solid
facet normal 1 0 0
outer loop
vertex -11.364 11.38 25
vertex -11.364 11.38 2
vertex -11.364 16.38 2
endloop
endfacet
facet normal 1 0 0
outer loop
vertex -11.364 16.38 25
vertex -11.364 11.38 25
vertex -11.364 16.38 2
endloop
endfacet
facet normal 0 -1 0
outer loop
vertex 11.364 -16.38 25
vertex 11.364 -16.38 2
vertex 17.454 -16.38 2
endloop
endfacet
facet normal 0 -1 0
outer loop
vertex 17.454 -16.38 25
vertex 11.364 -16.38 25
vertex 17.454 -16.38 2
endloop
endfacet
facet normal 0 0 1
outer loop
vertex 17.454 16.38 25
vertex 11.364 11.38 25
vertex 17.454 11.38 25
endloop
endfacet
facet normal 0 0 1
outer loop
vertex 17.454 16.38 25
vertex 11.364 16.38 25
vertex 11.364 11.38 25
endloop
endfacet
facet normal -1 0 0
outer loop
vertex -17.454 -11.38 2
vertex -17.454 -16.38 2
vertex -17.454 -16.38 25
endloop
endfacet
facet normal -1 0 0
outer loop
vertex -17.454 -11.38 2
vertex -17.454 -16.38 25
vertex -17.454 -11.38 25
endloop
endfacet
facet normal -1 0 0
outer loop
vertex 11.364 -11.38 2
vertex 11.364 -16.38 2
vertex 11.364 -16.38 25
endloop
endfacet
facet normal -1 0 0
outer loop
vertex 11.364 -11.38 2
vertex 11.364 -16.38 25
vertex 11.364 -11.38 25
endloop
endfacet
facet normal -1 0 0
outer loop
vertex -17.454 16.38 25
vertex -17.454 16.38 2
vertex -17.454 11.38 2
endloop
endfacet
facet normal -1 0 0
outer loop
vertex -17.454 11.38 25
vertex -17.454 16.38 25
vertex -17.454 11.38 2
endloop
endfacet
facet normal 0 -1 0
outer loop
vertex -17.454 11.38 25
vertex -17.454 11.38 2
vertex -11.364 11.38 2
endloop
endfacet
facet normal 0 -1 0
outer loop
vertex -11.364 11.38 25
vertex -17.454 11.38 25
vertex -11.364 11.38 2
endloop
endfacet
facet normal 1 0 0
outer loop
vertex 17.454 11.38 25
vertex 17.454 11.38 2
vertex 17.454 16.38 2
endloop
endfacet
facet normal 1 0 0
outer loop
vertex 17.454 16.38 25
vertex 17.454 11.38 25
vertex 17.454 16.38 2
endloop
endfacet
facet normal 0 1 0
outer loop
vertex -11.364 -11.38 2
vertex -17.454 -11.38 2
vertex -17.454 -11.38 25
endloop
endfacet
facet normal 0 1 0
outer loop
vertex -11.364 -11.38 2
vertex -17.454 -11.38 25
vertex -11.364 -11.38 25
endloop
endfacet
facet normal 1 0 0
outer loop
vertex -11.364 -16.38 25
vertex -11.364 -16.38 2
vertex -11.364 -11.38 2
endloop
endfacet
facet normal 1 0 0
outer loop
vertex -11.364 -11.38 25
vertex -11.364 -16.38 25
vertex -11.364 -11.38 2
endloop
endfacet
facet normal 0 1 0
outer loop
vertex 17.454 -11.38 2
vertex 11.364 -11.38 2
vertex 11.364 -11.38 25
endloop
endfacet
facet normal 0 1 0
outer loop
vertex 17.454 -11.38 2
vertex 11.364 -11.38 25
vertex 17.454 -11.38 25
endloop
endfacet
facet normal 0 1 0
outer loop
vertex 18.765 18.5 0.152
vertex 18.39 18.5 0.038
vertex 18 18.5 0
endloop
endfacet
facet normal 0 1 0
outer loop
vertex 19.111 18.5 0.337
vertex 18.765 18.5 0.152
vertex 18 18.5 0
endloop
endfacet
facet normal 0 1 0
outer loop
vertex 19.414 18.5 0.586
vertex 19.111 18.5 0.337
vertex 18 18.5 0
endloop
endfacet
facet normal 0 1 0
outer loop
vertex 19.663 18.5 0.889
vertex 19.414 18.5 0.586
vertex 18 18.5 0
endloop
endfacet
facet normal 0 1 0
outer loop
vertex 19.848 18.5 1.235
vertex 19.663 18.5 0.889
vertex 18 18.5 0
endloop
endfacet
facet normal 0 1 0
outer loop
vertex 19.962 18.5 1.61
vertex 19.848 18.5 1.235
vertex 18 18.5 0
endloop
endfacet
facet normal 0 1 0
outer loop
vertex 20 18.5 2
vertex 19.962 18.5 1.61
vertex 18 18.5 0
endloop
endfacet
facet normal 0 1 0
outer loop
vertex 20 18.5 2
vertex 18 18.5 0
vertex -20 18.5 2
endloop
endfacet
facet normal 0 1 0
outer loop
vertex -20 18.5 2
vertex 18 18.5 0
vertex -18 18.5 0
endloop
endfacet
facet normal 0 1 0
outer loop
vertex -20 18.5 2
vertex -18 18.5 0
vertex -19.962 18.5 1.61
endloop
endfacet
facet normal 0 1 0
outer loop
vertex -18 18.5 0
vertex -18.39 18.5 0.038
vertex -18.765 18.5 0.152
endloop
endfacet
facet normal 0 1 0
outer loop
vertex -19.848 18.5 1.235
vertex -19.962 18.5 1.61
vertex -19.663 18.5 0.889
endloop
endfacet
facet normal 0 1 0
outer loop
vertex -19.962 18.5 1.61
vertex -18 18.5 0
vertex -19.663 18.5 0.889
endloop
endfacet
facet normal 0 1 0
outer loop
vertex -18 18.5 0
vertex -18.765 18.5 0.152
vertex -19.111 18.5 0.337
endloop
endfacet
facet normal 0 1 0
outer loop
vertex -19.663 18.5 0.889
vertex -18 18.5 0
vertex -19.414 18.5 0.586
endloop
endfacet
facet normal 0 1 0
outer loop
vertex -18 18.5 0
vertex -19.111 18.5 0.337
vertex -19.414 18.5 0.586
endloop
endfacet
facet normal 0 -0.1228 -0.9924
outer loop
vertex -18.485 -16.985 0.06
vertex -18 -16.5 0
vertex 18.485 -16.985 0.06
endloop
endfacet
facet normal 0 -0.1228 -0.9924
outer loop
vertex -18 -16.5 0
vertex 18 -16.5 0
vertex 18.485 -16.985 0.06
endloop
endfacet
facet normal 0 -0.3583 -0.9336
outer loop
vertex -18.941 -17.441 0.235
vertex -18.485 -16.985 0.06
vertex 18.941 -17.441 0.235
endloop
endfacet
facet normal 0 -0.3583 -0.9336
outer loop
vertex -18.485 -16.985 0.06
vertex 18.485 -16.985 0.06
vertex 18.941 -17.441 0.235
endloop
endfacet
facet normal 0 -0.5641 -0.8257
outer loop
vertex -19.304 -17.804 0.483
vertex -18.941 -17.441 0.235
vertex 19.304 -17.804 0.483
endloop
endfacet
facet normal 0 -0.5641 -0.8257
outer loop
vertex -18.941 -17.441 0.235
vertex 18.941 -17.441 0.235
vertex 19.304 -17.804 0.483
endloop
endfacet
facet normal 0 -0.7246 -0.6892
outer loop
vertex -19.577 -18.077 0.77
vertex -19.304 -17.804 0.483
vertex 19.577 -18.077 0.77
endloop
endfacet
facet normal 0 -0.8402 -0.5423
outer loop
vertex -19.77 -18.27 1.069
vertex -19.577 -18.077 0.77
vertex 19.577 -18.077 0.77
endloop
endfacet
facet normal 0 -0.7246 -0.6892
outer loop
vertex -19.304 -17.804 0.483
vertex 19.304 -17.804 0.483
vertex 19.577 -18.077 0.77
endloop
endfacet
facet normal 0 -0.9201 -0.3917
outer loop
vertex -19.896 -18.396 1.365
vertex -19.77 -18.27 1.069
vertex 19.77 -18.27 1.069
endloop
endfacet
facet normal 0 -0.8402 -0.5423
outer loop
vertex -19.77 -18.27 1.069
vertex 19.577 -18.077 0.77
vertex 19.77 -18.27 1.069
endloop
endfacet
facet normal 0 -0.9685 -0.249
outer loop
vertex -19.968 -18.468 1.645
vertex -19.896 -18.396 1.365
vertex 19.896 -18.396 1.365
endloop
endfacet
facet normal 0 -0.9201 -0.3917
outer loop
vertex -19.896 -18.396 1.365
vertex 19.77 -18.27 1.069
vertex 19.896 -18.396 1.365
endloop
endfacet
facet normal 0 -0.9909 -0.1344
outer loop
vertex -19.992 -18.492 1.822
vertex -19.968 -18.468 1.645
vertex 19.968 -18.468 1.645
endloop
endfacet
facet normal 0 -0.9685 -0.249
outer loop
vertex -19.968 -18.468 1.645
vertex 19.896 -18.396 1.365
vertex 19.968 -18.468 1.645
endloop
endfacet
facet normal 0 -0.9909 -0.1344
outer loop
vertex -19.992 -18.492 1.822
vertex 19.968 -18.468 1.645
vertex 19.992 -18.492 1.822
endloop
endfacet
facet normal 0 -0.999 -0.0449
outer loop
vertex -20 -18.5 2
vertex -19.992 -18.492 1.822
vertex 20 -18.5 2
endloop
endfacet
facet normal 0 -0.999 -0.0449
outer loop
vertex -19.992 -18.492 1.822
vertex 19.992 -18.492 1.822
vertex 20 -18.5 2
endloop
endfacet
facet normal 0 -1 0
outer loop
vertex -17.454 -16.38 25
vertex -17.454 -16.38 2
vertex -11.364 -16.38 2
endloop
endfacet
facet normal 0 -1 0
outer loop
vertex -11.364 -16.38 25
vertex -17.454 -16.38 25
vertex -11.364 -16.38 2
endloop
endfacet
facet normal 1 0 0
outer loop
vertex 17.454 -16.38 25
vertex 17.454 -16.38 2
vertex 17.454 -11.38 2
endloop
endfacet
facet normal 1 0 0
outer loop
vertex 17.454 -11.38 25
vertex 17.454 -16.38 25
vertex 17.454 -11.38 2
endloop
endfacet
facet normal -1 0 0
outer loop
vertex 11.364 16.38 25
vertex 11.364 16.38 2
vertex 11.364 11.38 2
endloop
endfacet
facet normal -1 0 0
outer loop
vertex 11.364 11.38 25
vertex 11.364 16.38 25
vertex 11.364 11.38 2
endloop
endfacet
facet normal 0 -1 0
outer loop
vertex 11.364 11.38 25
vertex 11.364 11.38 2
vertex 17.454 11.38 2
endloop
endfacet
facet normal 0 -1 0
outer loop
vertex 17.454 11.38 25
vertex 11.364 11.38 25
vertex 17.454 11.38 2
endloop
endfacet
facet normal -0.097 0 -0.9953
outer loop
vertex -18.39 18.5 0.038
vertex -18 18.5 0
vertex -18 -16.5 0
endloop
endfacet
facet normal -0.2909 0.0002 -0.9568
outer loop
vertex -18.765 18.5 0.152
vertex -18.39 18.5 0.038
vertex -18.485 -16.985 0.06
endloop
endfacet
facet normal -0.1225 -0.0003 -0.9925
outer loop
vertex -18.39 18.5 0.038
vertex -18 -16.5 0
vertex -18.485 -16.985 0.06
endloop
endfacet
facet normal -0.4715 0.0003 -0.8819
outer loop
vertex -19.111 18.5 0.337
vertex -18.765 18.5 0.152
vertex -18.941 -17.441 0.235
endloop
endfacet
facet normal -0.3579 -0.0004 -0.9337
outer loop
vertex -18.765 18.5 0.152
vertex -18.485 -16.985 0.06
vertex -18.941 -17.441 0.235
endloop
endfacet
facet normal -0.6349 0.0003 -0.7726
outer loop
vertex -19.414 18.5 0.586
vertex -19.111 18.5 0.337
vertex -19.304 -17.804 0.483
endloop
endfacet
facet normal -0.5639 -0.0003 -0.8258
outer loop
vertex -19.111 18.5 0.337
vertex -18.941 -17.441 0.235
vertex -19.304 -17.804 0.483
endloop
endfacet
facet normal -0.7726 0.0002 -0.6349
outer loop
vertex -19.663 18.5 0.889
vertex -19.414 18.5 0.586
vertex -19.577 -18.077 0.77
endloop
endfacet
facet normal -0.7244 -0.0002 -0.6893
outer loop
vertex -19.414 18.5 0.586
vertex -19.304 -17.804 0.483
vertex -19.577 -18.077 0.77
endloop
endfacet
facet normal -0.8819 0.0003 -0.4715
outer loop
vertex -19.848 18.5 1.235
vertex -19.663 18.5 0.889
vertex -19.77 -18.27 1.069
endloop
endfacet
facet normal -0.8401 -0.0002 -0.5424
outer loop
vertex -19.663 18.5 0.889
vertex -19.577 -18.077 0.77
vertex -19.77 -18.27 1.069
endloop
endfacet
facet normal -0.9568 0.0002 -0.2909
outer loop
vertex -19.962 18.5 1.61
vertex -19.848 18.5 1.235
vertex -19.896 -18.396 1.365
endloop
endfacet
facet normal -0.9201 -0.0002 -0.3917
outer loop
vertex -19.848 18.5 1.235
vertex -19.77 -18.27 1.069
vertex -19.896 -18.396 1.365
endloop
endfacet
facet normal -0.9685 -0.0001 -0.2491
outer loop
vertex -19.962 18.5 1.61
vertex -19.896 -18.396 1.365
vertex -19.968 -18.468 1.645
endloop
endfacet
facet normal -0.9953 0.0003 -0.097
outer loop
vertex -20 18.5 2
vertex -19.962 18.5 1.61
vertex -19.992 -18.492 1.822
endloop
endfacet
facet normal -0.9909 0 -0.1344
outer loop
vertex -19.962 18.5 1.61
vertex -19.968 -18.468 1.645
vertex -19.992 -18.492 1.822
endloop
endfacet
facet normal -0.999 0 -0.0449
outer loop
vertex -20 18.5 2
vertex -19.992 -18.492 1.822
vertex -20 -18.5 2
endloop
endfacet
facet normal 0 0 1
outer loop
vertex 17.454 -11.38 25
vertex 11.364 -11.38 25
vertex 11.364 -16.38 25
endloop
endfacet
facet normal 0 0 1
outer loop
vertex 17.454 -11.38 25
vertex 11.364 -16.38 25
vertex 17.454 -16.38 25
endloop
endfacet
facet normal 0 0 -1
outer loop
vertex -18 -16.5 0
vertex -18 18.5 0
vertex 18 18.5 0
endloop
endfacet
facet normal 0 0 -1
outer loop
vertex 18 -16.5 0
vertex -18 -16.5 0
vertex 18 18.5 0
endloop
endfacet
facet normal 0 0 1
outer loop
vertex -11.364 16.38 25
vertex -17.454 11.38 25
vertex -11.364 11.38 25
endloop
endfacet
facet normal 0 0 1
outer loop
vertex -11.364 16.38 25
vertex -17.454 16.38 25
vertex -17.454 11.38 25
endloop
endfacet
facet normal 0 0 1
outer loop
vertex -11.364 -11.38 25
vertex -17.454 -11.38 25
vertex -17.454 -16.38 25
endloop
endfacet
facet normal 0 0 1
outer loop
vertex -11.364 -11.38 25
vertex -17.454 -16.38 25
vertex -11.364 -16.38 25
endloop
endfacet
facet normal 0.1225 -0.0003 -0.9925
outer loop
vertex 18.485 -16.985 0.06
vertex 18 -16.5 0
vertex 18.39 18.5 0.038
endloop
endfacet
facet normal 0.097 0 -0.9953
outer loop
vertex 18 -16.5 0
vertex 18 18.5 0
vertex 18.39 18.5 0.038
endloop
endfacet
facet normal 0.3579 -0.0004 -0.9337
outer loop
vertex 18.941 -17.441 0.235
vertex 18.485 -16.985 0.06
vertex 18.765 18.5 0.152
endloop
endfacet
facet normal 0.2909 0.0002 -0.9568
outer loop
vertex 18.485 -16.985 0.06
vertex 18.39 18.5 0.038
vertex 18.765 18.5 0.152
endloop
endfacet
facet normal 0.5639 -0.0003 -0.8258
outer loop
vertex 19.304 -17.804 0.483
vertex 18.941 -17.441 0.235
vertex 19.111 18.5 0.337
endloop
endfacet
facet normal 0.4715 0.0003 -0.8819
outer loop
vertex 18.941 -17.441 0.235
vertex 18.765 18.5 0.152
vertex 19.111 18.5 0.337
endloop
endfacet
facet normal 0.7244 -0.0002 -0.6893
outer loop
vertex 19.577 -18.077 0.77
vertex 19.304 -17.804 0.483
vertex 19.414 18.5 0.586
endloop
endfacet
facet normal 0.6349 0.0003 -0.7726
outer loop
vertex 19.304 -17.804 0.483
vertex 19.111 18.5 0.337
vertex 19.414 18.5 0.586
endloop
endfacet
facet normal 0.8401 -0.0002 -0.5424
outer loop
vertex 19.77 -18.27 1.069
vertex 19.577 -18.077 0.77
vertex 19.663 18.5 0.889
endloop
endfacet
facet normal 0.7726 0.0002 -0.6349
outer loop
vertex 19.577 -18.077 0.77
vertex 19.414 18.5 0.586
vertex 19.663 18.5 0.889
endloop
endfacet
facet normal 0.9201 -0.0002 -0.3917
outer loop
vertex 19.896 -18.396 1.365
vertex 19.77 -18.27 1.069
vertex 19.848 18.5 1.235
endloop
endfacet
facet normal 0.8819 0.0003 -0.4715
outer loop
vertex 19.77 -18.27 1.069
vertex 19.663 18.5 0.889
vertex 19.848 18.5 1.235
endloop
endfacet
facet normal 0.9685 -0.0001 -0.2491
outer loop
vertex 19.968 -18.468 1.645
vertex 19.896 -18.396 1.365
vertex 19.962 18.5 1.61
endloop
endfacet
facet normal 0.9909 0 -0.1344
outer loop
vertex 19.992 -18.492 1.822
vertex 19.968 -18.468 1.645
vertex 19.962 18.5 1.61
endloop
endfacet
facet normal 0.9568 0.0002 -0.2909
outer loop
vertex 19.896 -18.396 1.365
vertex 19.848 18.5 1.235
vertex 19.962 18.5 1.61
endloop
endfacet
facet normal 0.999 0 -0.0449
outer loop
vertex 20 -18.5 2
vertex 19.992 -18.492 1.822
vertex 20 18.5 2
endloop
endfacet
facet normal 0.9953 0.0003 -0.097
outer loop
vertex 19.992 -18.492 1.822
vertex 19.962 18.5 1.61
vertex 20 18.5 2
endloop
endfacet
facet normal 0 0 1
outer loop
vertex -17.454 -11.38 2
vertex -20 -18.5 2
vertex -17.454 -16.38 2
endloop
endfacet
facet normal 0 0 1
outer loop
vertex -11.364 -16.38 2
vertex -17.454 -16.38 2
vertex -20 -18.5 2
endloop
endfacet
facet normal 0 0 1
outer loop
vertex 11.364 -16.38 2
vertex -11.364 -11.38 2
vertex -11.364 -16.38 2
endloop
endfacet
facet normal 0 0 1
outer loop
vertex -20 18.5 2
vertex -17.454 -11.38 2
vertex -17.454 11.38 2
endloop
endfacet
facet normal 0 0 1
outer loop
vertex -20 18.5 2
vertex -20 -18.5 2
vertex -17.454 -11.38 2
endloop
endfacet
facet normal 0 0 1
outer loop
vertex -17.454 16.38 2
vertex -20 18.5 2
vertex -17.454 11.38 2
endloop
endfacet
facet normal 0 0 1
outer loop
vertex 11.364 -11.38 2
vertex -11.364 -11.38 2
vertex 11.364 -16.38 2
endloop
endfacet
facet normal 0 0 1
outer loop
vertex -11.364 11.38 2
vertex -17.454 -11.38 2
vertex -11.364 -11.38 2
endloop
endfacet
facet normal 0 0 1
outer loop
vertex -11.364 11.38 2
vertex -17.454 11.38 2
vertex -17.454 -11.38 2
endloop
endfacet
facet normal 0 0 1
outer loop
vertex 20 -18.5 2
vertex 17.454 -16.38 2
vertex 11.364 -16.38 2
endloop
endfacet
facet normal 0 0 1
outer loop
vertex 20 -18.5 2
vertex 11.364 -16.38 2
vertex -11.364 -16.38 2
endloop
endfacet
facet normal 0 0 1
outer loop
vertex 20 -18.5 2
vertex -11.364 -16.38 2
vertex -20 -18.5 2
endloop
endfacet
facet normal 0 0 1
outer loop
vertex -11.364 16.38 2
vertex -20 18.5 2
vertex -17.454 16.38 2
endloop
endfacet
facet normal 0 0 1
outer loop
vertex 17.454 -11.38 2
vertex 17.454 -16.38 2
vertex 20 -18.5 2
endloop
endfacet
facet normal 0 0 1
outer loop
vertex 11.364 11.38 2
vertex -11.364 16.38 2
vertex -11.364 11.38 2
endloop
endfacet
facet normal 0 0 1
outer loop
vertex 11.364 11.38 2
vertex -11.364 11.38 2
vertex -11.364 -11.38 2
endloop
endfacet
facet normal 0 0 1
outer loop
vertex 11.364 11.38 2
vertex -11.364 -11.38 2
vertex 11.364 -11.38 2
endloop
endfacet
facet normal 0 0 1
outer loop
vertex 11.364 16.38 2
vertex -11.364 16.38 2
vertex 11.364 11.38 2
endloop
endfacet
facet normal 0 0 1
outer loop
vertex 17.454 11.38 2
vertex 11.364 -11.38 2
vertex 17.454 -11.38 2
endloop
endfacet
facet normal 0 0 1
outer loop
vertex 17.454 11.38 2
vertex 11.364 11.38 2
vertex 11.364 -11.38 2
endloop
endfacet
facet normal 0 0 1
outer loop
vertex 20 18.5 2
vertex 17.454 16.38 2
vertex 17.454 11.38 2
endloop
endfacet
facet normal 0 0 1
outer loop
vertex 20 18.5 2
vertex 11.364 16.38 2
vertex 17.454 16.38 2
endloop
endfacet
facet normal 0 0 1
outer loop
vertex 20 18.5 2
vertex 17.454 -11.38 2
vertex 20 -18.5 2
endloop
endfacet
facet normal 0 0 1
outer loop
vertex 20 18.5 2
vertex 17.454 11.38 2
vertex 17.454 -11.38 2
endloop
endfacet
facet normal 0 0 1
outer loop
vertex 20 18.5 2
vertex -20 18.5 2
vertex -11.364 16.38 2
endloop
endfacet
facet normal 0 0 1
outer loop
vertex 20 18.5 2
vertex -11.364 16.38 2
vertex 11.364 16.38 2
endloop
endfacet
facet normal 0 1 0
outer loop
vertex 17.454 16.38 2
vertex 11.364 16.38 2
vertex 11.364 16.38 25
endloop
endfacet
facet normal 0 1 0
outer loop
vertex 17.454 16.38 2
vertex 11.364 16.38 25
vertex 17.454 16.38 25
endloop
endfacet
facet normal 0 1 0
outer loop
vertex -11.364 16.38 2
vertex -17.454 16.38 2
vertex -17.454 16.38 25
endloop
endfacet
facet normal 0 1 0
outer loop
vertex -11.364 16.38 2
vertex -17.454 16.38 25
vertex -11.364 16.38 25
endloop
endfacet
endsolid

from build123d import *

# Parameters (mm, degrees)
F0_W     = 6.0909511521
F0_H     = 5
F0_H_2   = 2.6896382868
F0_H_3   = 2.3103617132
F1_DEPTH = 2
F2_DEPTH = 25
F4_R     = 1.99999
F5_R     = 6.305532295
F6_DEPTH = 76


# Not quite as in the source:
# - a fillet or chamfer is up to 0.001 mm smaller than in the source, because OpenCascade refuses the exact size
# - an extrude ends at something that could not be found from the text; its depth is read off the source's solid


with BuildPart() as f1:
    # F0 (on Top) → F1 (new body)
    with BuildSketch(Plane.XY):
        Polygon((-17.4544863403, 13.6900003999), (-20, 13.6900003999), (-20, -18.5), (20, -18.5), (20, 13.6900003999), (17.4544863403, 13.6900003999), (17.4544863403, 11.3796386868), (11.3635351881, 11.3796386868), (11.3635351881, 13.6900003999), (-11.3635351881, 13.6900003999), (-11.3635351881, 11.3796386868), (-17.4544863403, 11.3796386868), align=None)
        with Locations((-14.4090107642, -13.8796386868)):
            Rectangle(F0_W, F0_H, mode=Mode.SUBTRACT)
        with Locations((14.4090107642, -13.8796386868)):
            Rectangle(F0_W, F0_H, mode=Mode.SUBTRACT)
        Polygon((20, 18.5), (-20, 18.5), (-20, 13.6900003999), (-17.4544863403, 13.6900003999), (-17.4544863403, 16.3796386868), (-11.3635351881, 16.3796386868), (-11.3635351881, 13.6900003999), (11.3635351881, 13.6900003999), (11.3635351881, 16.3796386868), (17.4544863403, 16.3796386868), (17.4544863403, 13.6900003999), (20, 13.6900003999), align=None)
        with Locations((14.4090107642, -13.8796386868)):
            Rectangle(F0_W, F0_H)
        with Locations((-14.4090107642, -13.8796386868)):
            Rectangle(F0_W, F0_H)
        with Locations((-14.4090107642, 15.0348195434)):
            Rectangle(F0_W, F0_H_2)
        with Locations((14.4090107642, 15.0348195434)):
            Rectangle(F0_W, F0_H_2)
        with Locations((14.4090107642, 12.5348195434)):
            Rectangle(F0_W, F0_H_3)
        with Locations((-14.4090107642, 12.5348195434)):
            Rectangle(F0_W, F0_H_3)
    extrude(amount=F1_DEPTH)

    # F0 (on Top) → F2 (join)
    with BuildSketch(Plane.XY):
        with Locations((14.4090107642, -13.8796386868)):
            Rectangle(F0_W, F0_H)
        with Locations((14.4090107642, 12.5348195434)):
            Rectangle(F0_W, F0_H_3)
        with Locations((14.4090107642, 15.0348195434)):
            Rectangle(F0_W, F0_H_2)
        with Locations((-14.4090107642, 12.5348195434)):
            Rectangle(F0_W, F0_H_3)
        with Locations((-14.4090107642, 15.0348195434)):
            Rectangle(F0_W, F0_H_2)
        with Locations((-14.4090107642, -13.8796386868)):
            Rectangle(F0_W, F0_H)
    extrude(amount=F2_DEPTH)

    # F4 (radius 2 in the source; OpenCascade refuses exactly that, so slightly less here)
    f4_edges = [f1.edges().sort_by_distance(p)[0] for p in [
        (20, 0, 0),
        (-20, 0, 0),
        (0, -18.5, 0),
    ]]
    fillet(f4_edges, radius=F4_R)

    # F5 (on face) → F6 (cut, through all)
    with BuildSketch(Plane(origin=(0, 13.6900003999, 0), x_dir=(-1, 0, 0), z_dir=(0, 1, 0))):
        with Locations((0, -14.4779002294)):
            Circle(F5_R)
    extrude(amount=F6_DEPTH, mode=Mode.SUBTRACT)


solid = f1.part
